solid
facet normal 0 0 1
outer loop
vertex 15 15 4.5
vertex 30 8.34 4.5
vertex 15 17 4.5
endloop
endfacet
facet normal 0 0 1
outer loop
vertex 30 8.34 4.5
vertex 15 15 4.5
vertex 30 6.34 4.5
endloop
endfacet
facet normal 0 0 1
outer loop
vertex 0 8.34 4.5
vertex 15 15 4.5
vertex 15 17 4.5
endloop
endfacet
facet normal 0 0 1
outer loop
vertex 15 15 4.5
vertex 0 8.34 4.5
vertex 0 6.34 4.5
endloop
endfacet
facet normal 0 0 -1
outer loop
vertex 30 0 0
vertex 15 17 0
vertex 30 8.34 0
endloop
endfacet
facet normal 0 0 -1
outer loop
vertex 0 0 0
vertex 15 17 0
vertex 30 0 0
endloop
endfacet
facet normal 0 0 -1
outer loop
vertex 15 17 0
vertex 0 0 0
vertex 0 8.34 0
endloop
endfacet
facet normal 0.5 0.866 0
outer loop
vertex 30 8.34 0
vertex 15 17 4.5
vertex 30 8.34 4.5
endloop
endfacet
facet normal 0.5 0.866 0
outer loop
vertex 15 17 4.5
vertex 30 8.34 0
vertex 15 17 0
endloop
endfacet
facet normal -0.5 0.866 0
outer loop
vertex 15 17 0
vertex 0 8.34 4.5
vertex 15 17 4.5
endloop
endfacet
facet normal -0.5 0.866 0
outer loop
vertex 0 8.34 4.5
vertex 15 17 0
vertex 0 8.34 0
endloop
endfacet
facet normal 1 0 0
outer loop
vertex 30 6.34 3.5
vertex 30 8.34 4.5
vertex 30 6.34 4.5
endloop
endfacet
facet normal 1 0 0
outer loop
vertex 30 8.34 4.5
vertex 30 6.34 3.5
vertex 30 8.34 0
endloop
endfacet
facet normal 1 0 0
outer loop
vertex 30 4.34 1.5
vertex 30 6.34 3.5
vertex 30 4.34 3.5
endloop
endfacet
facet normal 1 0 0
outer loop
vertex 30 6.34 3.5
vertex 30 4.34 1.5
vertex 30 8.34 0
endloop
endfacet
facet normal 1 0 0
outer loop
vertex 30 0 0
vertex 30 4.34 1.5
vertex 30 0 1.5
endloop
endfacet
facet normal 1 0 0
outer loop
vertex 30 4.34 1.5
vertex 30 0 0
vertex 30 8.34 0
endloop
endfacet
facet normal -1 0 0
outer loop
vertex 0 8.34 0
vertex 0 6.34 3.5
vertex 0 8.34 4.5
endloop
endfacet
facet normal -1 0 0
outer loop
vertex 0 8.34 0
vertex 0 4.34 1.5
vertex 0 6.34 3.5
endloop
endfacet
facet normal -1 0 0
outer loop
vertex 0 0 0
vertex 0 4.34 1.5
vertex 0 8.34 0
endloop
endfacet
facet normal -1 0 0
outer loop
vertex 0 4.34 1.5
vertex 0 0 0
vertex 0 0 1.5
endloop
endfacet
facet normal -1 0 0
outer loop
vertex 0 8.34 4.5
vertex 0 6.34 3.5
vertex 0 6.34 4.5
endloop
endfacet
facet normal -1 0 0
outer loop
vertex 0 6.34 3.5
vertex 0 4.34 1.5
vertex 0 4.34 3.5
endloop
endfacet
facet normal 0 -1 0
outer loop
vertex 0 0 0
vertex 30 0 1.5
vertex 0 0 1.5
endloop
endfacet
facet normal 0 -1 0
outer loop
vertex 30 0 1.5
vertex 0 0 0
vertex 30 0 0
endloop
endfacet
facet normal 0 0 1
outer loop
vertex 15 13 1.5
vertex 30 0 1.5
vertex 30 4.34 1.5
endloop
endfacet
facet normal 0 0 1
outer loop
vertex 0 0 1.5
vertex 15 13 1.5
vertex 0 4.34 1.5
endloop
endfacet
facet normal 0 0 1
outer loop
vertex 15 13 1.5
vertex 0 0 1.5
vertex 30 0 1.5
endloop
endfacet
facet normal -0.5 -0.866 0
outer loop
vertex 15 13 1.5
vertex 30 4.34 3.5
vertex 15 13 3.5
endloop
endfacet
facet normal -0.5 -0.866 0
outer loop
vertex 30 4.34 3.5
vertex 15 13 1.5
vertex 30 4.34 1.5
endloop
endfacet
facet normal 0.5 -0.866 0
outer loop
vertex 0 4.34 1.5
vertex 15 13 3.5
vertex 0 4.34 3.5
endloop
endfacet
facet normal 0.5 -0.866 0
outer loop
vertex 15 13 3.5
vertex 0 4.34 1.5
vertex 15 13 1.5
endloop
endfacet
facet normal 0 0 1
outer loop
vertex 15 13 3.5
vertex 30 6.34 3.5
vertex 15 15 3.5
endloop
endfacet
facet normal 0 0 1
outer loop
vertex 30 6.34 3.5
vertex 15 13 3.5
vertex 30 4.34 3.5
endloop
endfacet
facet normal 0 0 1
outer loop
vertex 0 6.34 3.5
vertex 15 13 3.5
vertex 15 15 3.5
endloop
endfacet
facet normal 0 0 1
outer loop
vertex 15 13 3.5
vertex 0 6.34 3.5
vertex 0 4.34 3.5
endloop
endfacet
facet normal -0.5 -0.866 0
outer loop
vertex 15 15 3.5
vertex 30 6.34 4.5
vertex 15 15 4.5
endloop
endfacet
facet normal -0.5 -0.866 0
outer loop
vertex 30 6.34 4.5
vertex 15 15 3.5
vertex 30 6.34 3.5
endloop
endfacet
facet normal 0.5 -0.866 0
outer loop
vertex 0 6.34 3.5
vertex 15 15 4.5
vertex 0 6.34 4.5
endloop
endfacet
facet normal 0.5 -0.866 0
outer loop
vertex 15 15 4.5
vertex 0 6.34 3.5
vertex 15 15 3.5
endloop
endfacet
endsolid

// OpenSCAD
module pointe()
{
difference()
{
cube([30,25,4.5]);
translate([15,17,0])
rotate([0,0,0])
union()
{
rotate([0,0,-30]) translate([-20,0,0]) cube([40,25,4.5]);
rotate([0,0,30])  translate([-20,0,0]) cube([40,25,4.5]);
}
}
}

difference()
{
pointe();
union()
{
translate([0,-4,1.5]) pointe();
translate([0,-2,3.5]) pointe();
}
}
